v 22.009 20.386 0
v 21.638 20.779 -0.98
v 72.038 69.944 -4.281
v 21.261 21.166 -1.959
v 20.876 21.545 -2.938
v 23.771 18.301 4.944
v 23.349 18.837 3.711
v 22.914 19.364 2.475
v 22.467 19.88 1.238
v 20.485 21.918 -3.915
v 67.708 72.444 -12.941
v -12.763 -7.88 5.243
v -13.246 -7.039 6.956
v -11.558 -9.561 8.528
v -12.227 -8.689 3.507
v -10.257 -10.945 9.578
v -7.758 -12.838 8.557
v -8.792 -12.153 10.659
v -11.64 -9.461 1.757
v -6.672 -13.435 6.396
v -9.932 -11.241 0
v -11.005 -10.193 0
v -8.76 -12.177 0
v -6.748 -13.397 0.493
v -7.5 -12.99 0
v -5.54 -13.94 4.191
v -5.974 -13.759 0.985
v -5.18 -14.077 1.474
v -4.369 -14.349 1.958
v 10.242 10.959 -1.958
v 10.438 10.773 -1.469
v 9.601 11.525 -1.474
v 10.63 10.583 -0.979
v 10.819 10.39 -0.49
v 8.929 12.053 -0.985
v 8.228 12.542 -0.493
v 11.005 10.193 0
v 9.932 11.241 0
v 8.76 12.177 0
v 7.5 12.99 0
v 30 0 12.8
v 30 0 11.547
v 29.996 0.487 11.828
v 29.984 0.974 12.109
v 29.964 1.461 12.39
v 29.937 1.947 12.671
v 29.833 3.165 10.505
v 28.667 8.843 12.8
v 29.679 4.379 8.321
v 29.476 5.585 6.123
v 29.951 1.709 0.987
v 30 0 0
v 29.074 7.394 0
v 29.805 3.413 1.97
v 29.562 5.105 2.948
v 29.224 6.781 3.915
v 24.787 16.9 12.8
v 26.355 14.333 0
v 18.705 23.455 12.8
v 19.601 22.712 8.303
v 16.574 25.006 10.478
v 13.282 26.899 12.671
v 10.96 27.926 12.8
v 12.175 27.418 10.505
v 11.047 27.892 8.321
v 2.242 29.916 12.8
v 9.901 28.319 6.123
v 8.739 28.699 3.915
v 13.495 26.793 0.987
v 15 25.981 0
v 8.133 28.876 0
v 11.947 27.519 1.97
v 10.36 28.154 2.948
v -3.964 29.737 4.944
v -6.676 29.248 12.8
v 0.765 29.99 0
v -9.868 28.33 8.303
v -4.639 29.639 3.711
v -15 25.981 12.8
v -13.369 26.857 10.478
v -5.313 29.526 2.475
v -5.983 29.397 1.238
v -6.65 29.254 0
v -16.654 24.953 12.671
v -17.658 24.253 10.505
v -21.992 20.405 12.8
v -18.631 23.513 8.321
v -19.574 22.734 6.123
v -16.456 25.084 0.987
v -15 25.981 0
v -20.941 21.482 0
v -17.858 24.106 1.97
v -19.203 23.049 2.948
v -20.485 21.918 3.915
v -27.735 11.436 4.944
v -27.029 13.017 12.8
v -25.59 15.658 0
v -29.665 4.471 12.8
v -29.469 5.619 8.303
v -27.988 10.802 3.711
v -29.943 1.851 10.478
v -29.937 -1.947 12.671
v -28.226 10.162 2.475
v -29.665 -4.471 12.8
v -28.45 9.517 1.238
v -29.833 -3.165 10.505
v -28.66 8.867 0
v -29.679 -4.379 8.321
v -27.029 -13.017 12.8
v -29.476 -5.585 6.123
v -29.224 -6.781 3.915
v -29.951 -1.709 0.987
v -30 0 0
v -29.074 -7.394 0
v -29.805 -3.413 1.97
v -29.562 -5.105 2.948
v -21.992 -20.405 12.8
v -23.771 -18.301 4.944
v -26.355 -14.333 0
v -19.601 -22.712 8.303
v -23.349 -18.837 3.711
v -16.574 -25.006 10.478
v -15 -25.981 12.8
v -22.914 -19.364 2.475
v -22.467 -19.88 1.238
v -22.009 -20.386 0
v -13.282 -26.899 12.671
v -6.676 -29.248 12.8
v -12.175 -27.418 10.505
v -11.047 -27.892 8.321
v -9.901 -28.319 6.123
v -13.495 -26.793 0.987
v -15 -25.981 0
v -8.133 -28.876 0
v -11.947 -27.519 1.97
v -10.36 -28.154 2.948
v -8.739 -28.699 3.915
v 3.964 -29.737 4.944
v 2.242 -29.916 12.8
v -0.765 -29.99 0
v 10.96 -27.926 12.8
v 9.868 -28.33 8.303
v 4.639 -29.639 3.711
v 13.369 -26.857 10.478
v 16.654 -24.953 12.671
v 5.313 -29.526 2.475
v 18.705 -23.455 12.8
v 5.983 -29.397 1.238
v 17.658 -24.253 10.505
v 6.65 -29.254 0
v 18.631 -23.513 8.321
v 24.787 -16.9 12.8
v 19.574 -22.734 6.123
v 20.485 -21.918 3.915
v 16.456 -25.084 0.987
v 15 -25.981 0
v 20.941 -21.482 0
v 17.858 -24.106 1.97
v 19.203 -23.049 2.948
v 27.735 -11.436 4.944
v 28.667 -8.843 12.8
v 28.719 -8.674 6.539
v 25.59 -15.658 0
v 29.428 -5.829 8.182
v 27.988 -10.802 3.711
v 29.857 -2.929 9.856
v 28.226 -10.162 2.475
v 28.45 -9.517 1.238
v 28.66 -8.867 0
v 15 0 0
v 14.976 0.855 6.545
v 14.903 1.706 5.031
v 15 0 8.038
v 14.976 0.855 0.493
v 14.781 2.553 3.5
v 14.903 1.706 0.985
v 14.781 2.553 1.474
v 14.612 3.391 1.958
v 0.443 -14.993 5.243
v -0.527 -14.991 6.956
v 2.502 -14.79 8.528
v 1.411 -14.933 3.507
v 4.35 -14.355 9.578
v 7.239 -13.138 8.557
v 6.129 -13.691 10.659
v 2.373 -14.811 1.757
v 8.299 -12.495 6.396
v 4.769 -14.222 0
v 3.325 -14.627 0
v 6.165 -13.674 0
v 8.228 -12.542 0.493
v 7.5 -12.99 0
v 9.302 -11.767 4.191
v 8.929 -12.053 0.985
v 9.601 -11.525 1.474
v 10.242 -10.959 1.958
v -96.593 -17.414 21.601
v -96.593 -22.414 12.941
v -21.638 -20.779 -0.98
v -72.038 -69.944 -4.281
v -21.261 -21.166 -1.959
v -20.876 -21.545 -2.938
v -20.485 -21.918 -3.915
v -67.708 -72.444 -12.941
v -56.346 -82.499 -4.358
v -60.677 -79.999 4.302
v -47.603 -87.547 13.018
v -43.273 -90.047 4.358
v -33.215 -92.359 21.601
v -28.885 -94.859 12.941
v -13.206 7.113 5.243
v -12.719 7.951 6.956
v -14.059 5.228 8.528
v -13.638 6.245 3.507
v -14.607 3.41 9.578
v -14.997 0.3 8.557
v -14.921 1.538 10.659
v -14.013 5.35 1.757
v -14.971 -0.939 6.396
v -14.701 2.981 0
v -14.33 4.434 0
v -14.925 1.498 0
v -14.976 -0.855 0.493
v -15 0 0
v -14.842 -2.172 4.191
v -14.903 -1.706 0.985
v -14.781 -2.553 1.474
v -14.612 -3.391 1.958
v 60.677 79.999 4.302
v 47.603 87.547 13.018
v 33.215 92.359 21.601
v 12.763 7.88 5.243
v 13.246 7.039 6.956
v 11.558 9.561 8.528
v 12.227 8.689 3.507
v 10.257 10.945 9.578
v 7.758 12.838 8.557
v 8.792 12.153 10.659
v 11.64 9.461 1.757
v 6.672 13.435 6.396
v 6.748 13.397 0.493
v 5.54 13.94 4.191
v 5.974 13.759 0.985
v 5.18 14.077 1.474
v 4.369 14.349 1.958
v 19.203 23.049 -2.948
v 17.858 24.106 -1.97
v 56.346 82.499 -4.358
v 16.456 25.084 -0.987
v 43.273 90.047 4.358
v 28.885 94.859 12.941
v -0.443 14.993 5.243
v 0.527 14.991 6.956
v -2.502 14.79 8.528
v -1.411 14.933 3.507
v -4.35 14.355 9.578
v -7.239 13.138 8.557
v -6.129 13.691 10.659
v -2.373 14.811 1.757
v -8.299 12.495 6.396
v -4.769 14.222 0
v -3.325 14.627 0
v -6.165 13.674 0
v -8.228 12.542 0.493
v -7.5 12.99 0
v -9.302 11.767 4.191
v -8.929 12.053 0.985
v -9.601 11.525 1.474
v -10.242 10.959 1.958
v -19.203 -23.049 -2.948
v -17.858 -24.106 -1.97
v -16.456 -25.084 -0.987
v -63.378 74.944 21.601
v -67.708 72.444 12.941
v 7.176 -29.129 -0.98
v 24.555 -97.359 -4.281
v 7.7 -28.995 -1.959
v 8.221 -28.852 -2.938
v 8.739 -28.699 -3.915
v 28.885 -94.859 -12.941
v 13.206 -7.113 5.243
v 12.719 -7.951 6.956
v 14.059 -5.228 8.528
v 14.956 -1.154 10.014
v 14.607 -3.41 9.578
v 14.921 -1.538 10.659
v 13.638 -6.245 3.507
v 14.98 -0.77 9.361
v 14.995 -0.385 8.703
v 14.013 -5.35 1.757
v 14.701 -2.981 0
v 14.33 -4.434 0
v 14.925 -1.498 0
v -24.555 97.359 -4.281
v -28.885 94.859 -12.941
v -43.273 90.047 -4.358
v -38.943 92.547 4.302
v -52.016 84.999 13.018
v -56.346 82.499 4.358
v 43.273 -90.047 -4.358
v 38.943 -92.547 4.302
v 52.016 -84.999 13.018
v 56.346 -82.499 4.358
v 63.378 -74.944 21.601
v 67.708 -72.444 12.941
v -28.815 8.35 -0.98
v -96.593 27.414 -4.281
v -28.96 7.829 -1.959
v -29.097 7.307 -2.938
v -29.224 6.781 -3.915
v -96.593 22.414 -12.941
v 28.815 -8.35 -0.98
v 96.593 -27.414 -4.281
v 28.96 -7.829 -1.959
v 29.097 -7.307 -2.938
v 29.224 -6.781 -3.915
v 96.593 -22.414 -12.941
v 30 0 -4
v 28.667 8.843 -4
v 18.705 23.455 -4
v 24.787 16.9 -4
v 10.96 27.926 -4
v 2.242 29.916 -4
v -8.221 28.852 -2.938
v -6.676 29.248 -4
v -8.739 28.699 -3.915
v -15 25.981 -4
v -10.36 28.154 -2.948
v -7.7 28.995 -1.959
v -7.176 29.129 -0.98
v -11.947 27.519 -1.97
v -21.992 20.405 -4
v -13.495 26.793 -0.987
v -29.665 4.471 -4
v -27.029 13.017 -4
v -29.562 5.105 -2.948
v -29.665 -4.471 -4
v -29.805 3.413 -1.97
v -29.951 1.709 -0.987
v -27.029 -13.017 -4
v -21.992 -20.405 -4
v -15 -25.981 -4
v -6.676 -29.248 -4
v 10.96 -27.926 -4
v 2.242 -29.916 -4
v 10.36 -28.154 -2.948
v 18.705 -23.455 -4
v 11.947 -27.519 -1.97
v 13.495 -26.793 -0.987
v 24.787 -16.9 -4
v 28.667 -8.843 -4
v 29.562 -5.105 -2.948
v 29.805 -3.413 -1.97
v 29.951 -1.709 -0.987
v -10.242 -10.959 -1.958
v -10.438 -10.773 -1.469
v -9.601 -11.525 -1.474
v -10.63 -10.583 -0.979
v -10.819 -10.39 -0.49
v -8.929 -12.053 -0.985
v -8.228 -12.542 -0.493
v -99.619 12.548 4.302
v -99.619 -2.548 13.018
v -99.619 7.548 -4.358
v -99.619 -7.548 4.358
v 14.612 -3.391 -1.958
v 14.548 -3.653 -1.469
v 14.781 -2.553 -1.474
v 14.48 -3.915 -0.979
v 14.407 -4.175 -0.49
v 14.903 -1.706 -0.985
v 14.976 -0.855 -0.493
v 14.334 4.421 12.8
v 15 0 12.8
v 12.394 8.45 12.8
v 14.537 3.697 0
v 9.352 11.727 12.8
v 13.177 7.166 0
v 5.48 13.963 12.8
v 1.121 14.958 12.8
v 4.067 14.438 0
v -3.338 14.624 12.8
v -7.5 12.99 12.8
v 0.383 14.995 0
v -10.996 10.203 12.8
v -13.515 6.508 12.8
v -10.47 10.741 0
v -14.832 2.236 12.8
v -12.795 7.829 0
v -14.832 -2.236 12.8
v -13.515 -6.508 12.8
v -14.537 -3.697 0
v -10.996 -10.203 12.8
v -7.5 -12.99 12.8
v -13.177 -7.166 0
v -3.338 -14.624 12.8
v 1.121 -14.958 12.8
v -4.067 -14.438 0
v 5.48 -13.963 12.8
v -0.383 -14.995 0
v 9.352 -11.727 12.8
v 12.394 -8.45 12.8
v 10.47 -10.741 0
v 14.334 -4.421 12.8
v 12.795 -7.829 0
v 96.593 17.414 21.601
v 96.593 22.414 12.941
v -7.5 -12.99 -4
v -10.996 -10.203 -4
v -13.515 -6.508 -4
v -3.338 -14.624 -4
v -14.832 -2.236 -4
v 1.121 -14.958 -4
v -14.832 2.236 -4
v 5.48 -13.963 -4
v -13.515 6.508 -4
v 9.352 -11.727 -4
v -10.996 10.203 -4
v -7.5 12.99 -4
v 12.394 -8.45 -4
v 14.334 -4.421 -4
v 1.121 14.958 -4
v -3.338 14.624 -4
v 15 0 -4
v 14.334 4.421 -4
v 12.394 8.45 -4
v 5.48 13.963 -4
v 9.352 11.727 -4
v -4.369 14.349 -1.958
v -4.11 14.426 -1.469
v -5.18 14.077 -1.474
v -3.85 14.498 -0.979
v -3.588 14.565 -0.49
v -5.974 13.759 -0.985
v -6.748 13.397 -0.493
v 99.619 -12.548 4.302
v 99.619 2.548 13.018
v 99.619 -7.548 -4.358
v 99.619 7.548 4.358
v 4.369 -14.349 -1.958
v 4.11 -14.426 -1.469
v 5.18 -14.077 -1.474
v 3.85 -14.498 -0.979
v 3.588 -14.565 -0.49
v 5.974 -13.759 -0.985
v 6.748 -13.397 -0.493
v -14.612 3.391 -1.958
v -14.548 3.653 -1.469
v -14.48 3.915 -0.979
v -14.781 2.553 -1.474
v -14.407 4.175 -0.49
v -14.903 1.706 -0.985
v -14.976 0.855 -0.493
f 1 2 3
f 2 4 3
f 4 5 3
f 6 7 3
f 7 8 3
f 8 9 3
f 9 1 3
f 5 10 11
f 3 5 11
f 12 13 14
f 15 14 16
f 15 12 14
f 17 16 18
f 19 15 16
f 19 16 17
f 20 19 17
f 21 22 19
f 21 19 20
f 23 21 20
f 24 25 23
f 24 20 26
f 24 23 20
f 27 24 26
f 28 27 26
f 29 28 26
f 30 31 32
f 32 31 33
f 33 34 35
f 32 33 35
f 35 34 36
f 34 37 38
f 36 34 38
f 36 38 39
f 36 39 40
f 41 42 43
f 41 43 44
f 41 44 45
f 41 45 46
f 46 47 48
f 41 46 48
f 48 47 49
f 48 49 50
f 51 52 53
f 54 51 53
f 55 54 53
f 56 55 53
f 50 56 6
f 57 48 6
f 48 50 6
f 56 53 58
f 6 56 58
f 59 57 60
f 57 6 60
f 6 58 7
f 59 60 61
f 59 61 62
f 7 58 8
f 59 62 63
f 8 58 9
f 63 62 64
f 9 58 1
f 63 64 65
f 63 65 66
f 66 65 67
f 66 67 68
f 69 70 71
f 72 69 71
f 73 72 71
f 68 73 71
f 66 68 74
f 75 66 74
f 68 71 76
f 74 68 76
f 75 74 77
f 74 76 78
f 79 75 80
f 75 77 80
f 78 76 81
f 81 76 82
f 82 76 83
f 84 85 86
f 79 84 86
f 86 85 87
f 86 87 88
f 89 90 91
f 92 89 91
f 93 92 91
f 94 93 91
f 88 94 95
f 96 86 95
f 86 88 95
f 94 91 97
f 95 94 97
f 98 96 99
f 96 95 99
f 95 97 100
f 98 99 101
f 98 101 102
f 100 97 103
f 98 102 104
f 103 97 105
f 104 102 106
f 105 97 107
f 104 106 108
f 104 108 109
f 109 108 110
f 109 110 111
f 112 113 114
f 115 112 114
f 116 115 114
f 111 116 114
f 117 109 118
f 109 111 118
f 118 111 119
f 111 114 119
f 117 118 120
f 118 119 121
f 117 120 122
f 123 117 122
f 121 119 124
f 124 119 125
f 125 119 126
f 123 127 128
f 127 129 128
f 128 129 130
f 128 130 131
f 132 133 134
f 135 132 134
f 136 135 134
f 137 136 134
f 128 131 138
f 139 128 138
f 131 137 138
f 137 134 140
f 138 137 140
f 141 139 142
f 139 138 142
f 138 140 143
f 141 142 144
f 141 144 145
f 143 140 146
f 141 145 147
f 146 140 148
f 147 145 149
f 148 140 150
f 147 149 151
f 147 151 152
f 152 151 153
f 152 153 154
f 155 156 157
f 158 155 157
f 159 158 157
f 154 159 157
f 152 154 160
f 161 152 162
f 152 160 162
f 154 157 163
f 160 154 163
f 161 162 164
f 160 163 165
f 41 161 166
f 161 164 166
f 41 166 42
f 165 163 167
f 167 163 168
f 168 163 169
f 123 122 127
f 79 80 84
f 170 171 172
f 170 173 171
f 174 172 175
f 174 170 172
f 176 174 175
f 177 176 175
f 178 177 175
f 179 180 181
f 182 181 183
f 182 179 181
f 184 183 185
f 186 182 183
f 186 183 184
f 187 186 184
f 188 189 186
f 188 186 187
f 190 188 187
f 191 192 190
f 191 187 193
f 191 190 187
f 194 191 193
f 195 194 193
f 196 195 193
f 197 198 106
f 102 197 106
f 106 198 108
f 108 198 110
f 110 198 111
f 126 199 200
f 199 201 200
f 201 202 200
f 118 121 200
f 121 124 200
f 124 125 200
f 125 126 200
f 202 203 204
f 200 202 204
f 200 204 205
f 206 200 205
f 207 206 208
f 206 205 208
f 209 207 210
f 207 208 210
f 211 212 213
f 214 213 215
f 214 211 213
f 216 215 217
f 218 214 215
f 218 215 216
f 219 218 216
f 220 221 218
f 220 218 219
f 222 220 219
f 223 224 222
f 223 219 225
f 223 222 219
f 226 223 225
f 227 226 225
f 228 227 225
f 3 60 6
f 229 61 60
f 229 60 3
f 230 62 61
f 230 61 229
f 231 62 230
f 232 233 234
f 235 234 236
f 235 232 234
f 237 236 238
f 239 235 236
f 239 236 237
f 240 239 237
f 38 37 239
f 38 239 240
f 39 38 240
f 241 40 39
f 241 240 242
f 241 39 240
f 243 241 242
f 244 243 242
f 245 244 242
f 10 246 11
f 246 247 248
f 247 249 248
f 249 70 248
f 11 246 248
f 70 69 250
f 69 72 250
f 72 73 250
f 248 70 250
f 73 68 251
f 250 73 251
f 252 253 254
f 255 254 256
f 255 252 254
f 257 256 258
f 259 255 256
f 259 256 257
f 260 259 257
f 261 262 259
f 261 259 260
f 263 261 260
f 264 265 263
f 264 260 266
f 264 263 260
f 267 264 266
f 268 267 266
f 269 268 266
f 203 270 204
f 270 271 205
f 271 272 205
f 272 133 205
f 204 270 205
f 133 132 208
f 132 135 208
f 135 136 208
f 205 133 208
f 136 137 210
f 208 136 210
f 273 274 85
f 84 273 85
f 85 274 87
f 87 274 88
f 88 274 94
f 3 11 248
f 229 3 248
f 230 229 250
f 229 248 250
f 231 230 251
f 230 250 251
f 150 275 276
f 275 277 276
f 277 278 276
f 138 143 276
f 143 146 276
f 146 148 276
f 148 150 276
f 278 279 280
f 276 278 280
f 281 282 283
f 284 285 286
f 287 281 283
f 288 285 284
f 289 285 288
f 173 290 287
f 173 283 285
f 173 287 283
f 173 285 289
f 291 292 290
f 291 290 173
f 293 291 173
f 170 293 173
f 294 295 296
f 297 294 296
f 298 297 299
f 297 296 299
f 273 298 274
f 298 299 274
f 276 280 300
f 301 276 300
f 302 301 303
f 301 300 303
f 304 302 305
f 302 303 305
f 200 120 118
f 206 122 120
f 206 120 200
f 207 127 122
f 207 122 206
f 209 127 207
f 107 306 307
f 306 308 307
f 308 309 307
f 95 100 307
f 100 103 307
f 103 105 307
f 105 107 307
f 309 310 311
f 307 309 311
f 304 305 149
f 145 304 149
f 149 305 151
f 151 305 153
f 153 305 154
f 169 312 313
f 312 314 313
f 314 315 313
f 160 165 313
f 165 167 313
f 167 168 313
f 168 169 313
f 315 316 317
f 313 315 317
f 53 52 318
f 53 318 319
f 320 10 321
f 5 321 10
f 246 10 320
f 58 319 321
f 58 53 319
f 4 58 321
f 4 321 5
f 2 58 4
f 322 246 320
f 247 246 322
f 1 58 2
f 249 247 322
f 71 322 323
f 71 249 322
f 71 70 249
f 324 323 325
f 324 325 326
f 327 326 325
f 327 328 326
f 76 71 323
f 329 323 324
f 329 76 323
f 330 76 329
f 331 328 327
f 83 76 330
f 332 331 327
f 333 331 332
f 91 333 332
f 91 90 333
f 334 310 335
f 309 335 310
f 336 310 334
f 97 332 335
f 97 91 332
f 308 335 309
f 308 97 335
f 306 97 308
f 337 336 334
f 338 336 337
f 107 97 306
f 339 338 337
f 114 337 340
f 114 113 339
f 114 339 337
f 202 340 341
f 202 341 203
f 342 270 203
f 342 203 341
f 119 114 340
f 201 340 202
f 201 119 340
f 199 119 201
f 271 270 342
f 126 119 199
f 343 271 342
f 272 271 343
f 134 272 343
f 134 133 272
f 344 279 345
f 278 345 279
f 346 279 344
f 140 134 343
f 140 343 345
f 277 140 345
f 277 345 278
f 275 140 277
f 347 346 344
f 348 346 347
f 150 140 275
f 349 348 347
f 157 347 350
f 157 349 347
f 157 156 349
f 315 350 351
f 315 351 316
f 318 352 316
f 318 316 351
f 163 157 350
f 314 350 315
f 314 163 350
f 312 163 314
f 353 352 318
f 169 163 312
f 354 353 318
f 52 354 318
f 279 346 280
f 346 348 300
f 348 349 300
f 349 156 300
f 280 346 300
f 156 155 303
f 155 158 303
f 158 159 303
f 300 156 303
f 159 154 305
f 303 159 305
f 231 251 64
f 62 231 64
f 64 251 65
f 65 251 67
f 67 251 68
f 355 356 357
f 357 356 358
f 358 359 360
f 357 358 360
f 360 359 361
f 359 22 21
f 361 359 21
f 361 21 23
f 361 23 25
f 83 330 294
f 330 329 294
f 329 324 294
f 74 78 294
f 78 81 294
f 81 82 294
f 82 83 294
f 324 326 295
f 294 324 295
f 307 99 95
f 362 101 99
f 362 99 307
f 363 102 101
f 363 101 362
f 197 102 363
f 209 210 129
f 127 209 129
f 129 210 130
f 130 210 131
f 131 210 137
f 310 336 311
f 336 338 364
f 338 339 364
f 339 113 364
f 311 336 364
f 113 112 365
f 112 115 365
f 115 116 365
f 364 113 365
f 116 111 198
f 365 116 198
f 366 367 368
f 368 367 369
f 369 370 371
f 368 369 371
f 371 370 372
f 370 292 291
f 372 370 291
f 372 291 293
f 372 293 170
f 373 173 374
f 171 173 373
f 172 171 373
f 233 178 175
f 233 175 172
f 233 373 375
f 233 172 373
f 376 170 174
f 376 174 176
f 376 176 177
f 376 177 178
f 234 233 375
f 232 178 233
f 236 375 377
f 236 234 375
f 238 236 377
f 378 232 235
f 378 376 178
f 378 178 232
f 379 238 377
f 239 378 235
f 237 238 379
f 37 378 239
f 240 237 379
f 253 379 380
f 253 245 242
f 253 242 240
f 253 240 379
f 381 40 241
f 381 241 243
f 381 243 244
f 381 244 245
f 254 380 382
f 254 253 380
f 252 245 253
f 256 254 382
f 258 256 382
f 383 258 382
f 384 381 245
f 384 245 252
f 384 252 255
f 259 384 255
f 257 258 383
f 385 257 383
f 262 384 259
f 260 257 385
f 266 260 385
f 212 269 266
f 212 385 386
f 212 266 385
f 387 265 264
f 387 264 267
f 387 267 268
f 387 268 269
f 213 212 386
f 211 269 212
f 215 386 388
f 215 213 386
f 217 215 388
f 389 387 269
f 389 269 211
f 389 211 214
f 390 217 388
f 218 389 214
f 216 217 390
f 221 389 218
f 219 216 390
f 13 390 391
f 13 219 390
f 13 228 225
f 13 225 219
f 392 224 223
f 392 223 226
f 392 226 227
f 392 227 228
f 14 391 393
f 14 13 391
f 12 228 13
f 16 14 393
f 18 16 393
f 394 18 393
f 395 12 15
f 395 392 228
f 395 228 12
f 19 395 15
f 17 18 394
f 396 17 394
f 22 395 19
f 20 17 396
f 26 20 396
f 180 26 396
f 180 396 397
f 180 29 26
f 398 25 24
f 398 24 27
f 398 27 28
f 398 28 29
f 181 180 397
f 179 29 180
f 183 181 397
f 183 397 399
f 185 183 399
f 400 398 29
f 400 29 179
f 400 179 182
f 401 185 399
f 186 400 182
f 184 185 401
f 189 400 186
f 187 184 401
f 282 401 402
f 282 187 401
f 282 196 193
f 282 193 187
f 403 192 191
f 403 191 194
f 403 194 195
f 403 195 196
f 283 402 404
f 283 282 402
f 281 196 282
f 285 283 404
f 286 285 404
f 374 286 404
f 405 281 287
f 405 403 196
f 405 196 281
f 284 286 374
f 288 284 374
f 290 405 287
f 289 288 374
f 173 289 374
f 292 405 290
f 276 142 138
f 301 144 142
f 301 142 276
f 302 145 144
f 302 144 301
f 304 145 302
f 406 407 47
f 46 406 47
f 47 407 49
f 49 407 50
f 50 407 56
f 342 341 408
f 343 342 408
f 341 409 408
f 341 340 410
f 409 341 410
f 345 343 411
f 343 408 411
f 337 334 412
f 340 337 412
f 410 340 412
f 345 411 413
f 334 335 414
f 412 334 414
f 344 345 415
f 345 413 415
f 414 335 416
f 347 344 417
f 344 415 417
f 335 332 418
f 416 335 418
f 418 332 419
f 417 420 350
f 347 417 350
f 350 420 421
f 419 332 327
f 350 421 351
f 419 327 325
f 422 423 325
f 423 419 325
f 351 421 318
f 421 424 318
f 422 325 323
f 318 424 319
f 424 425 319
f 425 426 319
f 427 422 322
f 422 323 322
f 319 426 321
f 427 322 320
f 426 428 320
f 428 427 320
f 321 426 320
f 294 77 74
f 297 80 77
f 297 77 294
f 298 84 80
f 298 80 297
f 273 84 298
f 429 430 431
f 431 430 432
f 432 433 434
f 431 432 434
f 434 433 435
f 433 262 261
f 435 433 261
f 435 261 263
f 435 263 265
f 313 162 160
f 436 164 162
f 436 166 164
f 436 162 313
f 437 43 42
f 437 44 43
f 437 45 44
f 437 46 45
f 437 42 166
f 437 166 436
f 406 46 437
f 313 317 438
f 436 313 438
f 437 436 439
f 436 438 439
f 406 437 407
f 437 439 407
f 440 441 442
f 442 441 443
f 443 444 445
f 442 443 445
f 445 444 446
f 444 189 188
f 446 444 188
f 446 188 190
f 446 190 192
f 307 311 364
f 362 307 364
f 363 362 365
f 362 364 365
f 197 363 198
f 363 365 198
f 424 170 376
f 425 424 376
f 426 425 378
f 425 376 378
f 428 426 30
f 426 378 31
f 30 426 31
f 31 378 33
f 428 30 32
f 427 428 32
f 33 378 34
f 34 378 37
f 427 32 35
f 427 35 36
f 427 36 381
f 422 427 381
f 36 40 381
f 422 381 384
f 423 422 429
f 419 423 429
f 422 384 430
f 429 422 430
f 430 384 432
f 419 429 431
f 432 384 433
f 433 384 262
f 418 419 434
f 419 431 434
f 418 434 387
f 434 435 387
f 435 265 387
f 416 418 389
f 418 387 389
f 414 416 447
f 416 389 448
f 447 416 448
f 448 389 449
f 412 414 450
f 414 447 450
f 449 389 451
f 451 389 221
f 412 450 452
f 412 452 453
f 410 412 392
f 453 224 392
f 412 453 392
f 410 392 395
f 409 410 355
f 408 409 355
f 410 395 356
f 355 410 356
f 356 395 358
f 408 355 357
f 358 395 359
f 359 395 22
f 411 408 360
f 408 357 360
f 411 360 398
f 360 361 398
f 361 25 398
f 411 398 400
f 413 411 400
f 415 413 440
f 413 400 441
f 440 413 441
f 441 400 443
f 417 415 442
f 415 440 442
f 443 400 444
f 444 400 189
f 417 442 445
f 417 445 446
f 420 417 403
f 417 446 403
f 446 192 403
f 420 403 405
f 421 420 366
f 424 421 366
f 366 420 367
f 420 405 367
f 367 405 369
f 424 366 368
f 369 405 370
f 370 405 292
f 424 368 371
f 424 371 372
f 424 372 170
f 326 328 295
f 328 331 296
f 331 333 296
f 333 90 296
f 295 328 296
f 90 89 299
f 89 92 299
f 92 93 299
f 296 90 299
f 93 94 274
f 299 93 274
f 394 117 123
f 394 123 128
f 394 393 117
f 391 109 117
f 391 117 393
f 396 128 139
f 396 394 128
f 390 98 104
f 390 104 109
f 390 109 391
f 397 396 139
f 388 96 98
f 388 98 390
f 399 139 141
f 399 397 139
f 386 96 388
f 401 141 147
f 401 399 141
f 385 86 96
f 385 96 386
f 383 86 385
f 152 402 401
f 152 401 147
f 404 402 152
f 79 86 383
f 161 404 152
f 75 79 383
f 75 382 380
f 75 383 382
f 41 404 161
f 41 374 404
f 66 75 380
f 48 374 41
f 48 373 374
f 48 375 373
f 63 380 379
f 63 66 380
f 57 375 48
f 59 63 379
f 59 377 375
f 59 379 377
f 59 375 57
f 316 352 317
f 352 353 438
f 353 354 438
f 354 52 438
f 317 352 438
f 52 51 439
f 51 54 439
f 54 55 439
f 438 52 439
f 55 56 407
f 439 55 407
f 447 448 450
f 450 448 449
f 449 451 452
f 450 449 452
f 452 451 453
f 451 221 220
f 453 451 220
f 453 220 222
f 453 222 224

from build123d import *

# Parameters (mm, degrees)
F1_DEPTH      = 10
F3_ANGLE      = 30
F5_COUNT      = 6
F6_R          = 30
F6_R_2        = 15
F7_DEPTH      = 12.8
F7_DEPTH_BACK = 4
F8_R          = 15
F9_DEPTH      = 25
F9_DEPTH_BACK = 25


with BuildPart() as f1:
    # F0 (on Top) → F1 (new body)
    with BuildSketch(Plane.XY):
        with BuildLine():
            Line((96.5925826289, 25.8819045103), (0, 0))
            Line((0, 0), (96.5925826289, -25.8819045103))
            ThreePointArc((96.5925826289, -25.8819045103), (100, 0), (96.5925826289, 25.8819045103))
        make_face()
    extrude(amount=F1_DEPTH)


with BuildPart() as f1_1:
    # F3: moved
    add(f1.part.rotate(Axis((55.2566722035, 0, 0), (1, 0, 0)), F3_ANGLE))

    # F5: F1 ×6 about axis
    f5_axis = Axis((0, 0, 15.24533052), (0, 0, 1))


with BuildPart() as f1_2:
    add(f1_1.part)
    for i in range(1, F5_COUNT):
        add(f1_1.part.rotate(f5_axis, i * 360 / F5_COUNT))

    # F6 (on Top) → F7 (join, two sides)
    with BuildSketch(Plane.XY) as f7_sk:
        Circle(F6_R)
        Circle(F6_R_2, mode=Mode.SUBTRACT)
    extrude(amount=F7_DEPTH)
    extrude(f7_sk.sketch, amount=-F7_DEPTH_BACK)

    # F8 (on Top) → F9 (cut, two sides)
    with BuildSketch(Plane.XY) as f9_sk:
        Circle(F8_R)
    extrude(amount=-F9_DEPTH, mode=Mode.SUBTRACT)
    extrude(f9_sk.sketch, amount=F9_DEPTH_BACK, mode=Mode.SUBTRACT)


solid = f1_2.part
